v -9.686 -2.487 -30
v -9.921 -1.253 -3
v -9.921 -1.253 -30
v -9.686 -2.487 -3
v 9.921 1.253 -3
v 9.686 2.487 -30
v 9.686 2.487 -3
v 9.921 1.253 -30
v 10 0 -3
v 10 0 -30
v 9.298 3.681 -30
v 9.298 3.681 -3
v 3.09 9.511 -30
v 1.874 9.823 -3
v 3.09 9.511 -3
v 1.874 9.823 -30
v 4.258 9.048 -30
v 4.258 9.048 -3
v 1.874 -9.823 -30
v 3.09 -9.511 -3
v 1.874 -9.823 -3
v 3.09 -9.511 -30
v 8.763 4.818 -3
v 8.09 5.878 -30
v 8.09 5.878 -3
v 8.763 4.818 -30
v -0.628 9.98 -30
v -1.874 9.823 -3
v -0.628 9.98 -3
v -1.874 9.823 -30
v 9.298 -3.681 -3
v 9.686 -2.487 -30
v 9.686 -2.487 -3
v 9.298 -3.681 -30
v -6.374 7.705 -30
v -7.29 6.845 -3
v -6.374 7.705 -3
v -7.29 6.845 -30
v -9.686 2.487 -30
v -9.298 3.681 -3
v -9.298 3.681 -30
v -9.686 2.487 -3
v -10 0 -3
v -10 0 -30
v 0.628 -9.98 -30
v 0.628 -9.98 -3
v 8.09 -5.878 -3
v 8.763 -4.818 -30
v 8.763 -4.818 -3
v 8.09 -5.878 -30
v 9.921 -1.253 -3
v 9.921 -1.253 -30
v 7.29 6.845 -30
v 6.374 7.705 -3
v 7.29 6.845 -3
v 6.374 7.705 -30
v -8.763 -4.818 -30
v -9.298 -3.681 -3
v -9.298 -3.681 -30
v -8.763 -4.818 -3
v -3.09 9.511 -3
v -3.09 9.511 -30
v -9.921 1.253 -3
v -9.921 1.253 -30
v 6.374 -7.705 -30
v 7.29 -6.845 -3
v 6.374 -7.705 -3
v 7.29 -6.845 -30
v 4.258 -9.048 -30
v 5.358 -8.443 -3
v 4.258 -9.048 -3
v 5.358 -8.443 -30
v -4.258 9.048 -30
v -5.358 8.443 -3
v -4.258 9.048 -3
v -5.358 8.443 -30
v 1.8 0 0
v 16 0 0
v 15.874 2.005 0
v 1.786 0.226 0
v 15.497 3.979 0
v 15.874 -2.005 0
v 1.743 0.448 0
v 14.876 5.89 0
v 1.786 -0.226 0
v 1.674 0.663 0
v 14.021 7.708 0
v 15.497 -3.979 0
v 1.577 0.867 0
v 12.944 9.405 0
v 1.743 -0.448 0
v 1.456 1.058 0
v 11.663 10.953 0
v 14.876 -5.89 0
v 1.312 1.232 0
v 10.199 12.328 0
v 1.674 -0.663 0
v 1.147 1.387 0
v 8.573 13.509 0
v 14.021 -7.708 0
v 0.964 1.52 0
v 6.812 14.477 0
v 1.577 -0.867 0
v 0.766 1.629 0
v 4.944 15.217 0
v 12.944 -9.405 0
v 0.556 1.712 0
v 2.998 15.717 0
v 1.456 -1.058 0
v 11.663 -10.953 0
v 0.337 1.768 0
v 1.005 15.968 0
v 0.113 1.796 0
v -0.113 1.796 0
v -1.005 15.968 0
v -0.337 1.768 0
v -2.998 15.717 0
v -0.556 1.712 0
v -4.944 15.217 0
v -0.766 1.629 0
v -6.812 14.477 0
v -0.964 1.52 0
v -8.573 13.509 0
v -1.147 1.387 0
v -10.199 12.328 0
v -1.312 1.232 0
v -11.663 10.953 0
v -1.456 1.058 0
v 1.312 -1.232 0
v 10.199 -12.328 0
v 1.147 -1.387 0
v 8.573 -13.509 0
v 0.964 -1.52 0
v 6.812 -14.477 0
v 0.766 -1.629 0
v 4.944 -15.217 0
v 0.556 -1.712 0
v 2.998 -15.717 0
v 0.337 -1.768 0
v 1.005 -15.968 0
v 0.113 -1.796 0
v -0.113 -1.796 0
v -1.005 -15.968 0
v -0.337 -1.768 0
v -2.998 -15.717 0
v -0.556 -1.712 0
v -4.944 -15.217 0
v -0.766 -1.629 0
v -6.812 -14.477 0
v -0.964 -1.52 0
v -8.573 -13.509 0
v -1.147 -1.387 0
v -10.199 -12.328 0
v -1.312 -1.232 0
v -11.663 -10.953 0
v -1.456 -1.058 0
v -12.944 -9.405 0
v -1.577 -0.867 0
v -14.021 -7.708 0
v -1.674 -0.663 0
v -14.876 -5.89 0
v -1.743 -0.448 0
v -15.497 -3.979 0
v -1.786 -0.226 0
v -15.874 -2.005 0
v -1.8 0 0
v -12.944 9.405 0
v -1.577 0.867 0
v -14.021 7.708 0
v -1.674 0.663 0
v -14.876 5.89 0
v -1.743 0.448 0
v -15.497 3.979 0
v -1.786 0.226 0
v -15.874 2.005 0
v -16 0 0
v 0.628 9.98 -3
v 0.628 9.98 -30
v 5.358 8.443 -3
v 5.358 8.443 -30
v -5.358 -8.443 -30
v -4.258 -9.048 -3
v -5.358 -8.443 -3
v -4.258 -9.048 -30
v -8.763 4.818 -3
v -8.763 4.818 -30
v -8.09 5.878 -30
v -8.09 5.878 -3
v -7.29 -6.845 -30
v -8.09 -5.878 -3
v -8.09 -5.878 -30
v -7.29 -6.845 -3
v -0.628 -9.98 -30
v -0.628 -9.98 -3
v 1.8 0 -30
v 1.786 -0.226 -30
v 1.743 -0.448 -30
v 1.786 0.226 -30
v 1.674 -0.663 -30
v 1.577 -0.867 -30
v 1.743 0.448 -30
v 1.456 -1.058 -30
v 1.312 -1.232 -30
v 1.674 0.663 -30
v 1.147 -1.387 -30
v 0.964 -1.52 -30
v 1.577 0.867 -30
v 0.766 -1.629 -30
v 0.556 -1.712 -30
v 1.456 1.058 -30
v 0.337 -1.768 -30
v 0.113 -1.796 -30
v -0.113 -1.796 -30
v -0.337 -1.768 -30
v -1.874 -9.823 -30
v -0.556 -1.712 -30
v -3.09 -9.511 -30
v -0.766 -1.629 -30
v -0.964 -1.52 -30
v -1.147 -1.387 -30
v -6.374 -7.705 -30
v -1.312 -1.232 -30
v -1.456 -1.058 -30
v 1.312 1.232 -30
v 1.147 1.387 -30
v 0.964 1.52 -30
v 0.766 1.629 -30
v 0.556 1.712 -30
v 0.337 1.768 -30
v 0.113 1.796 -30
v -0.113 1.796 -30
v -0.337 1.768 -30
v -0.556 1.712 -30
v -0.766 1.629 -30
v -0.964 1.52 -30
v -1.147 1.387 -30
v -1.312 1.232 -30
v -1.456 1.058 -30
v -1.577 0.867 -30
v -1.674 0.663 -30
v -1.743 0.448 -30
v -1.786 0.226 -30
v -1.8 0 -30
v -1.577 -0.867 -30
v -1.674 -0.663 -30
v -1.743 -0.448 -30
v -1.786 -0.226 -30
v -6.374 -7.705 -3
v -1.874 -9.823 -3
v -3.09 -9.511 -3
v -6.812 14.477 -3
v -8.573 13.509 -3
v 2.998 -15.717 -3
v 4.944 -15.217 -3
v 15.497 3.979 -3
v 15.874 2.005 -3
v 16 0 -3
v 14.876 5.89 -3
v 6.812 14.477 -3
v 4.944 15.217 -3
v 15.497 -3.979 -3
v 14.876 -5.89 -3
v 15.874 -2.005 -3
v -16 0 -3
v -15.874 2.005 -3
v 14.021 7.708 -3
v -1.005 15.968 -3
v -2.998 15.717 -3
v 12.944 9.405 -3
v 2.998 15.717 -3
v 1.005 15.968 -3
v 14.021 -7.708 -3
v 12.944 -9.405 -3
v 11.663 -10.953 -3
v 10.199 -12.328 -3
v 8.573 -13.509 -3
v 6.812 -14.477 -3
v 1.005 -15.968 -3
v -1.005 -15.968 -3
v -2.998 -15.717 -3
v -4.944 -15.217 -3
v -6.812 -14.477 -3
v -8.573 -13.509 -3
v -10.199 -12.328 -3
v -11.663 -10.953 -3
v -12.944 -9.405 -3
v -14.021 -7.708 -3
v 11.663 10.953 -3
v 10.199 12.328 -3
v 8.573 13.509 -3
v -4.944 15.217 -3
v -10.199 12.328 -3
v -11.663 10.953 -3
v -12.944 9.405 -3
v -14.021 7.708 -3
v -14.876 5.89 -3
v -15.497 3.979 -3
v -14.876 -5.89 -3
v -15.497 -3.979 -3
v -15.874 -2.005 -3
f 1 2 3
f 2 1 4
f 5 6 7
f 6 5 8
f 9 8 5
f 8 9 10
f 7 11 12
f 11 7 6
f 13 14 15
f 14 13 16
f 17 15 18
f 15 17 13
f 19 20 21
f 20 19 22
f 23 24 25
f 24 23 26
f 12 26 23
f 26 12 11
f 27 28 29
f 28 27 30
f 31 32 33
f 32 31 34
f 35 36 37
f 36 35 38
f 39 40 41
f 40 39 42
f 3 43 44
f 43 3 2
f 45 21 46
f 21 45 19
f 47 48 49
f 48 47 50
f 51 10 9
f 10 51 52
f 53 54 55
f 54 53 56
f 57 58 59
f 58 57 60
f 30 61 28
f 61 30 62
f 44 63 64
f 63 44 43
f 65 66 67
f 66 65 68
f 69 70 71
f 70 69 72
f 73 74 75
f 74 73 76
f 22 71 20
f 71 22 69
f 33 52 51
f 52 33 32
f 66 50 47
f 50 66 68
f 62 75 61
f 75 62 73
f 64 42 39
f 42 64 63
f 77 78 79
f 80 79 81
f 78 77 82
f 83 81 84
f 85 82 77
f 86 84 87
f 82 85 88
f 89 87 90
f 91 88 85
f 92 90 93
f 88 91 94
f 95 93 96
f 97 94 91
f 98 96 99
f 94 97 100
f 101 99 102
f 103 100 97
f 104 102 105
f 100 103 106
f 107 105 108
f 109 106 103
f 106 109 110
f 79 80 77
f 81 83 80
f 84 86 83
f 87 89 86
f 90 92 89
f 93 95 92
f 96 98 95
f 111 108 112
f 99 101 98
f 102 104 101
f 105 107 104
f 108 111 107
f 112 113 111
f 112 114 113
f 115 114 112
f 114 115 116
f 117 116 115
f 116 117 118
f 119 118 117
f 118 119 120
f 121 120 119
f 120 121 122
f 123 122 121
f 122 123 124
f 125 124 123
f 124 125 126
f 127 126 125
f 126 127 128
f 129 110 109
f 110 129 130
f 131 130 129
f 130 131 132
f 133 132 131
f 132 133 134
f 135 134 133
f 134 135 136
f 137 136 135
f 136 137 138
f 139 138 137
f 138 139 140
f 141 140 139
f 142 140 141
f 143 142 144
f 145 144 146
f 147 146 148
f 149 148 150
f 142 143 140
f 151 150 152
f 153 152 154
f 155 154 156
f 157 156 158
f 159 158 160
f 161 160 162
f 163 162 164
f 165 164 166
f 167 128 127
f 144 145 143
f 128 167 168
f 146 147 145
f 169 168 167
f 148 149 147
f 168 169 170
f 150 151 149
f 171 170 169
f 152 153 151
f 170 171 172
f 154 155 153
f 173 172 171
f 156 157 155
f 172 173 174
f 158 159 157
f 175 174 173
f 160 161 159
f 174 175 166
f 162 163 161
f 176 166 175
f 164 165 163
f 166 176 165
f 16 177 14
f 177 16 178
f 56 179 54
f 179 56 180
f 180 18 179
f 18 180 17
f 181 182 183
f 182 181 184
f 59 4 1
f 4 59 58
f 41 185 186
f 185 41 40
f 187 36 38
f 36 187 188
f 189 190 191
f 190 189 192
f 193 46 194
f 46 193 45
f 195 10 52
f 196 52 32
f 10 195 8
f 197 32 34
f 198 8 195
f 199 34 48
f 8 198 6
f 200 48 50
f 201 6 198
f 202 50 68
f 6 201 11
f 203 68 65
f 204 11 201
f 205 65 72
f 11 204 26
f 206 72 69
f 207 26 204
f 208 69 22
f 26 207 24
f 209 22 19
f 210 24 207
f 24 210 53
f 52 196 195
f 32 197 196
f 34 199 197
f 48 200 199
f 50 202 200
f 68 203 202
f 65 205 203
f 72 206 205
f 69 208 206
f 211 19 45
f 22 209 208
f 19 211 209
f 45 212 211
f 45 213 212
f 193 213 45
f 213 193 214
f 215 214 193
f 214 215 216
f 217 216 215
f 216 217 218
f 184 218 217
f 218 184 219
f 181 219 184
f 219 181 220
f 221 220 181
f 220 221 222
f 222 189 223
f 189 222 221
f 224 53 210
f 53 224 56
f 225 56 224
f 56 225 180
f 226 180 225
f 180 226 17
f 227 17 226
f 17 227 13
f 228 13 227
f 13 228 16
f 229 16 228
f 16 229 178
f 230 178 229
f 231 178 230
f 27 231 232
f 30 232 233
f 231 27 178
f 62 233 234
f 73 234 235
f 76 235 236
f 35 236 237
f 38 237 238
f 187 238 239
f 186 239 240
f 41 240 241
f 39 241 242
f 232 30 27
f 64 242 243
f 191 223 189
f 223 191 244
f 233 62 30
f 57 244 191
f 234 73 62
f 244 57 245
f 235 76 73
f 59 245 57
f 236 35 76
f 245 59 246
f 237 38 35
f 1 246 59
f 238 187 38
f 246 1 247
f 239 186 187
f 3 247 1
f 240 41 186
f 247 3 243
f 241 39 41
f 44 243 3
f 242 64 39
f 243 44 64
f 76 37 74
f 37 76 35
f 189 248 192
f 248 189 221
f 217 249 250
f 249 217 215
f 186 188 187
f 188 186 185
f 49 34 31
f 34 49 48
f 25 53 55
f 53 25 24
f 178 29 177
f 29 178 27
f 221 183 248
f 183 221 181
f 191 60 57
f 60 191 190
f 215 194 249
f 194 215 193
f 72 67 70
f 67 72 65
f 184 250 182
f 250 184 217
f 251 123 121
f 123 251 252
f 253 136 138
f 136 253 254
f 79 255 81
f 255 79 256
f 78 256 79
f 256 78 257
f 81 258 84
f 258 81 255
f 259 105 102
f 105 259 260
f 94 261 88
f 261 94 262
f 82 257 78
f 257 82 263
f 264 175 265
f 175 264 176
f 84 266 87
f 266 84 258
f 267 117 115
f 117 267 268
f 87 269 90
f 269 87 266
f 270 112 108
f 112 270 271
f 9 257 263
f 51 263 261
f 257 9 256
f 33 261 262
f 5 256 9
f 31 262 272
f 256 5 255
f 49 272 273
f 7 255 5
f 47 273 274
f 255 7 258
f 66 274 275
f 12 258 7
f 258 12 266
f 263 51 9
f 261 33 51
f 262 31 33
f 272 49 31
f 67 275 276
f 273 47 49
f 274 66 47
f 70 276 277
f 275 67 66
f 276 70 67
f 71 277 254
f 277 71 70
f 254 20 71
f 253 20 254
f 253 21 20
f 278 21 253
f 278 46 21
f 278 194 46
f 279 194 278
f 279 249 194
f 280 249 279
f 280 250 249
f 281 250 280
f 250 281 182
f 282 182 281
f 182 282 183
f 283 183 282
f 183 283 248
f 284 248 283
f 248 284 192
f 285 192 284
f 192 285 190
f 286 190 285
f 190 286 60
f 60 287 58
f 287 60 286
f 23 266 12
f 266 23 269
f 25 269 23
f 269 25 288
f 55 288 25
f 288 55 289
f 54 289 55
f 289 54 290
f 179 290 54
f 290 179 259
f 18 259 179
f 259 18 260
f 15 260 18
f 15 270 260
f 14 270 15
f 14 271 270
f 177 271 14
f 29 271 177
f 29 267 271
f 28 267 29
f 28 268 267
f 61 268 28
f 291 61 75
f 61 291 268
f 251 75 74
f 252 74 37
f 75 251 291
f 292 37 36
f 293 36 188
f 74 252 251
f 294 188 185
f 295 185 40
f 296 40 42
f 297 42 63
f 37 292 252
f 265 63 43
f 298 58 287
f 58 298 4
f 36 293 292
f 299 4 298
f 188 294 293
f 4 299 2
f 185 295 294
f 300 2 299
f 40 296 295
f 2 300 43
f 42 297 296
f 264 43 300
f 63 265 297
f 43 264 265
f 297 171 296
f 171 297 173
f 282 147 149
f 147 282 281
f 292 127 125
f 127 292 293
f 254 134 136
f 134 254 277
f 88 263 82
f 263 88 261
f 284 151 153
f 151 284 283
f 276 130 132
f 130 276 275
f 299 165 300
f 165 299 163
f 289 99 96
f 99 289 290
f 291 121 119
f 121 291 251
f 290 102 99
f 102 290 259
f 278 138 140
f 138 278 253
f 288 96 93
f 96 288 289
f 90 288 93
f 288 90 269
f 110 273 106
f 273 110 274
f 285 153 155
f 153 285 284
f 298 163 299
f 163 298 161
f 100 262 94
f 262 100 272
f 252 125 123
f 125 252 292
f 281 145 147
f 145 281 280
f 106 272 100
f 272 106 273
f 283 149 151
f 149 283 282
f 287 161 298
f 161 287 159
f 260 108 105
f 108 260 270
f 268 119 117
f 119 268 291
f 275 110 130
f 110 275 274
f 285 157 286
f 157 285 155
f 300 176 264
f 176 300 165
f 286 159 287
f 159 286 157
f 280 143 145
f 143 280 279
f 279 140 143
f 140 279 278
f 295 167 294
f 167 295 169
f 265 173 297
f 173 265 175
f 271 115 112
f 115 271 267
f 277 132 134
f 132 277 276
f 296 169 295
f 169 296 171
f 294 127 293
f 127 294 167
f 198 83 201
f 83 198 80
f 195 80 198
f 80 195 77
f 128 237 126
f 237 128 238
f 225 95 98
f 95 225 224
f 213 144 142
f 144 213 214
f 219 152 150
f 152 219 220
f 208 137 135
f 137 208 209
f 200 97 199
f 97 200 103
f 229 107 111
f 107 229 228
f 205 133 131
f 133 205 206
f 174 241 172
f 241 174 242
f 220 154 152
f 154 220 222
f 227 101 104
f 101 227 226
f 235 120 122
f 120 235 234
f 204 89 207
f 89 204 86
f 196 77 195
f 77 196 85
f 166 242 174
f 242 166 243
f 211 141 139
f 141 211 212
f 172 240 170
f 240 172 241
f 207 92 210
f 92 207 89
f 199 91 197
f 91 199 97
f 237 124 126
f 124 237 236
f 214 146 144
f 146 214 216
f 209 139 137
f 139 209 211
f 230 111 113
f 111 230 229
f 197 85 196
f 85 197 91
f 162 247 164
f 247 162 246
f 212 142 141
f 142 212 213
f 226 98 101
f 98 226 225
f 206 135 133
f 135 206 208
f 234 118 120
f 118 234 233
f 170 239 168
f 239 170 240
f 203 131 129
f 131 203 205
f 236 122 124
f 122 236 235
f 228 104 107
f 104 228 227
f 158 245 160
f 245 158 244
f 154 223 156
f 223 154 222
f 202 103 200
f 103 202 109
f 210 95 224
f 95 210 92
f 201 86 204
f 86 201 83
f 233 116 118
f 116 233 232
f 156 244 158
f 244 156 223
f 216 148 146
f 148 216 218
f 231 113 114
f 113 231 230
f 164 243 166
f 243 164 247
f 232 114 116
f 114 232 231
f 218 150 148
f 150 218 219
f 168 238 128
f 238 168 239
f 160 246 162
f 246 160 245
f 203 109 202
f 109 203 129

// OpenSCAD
$fn = 50;


difference() {
	union() {
		translate(v = [0, 0, -30.0000000000]) {
			cylinder(h = 30, r = 10.0000000000);
		}
		translate(v = [0, 0, -3.0000000000]) {
			cylinder(h = 3, r = 16.0000000000);
		}
	}
	union() {
		#translate(v = [0, 0, -30]) {
			cylinder(h = 30, r = 1.8000000000);
		}
	}
}
